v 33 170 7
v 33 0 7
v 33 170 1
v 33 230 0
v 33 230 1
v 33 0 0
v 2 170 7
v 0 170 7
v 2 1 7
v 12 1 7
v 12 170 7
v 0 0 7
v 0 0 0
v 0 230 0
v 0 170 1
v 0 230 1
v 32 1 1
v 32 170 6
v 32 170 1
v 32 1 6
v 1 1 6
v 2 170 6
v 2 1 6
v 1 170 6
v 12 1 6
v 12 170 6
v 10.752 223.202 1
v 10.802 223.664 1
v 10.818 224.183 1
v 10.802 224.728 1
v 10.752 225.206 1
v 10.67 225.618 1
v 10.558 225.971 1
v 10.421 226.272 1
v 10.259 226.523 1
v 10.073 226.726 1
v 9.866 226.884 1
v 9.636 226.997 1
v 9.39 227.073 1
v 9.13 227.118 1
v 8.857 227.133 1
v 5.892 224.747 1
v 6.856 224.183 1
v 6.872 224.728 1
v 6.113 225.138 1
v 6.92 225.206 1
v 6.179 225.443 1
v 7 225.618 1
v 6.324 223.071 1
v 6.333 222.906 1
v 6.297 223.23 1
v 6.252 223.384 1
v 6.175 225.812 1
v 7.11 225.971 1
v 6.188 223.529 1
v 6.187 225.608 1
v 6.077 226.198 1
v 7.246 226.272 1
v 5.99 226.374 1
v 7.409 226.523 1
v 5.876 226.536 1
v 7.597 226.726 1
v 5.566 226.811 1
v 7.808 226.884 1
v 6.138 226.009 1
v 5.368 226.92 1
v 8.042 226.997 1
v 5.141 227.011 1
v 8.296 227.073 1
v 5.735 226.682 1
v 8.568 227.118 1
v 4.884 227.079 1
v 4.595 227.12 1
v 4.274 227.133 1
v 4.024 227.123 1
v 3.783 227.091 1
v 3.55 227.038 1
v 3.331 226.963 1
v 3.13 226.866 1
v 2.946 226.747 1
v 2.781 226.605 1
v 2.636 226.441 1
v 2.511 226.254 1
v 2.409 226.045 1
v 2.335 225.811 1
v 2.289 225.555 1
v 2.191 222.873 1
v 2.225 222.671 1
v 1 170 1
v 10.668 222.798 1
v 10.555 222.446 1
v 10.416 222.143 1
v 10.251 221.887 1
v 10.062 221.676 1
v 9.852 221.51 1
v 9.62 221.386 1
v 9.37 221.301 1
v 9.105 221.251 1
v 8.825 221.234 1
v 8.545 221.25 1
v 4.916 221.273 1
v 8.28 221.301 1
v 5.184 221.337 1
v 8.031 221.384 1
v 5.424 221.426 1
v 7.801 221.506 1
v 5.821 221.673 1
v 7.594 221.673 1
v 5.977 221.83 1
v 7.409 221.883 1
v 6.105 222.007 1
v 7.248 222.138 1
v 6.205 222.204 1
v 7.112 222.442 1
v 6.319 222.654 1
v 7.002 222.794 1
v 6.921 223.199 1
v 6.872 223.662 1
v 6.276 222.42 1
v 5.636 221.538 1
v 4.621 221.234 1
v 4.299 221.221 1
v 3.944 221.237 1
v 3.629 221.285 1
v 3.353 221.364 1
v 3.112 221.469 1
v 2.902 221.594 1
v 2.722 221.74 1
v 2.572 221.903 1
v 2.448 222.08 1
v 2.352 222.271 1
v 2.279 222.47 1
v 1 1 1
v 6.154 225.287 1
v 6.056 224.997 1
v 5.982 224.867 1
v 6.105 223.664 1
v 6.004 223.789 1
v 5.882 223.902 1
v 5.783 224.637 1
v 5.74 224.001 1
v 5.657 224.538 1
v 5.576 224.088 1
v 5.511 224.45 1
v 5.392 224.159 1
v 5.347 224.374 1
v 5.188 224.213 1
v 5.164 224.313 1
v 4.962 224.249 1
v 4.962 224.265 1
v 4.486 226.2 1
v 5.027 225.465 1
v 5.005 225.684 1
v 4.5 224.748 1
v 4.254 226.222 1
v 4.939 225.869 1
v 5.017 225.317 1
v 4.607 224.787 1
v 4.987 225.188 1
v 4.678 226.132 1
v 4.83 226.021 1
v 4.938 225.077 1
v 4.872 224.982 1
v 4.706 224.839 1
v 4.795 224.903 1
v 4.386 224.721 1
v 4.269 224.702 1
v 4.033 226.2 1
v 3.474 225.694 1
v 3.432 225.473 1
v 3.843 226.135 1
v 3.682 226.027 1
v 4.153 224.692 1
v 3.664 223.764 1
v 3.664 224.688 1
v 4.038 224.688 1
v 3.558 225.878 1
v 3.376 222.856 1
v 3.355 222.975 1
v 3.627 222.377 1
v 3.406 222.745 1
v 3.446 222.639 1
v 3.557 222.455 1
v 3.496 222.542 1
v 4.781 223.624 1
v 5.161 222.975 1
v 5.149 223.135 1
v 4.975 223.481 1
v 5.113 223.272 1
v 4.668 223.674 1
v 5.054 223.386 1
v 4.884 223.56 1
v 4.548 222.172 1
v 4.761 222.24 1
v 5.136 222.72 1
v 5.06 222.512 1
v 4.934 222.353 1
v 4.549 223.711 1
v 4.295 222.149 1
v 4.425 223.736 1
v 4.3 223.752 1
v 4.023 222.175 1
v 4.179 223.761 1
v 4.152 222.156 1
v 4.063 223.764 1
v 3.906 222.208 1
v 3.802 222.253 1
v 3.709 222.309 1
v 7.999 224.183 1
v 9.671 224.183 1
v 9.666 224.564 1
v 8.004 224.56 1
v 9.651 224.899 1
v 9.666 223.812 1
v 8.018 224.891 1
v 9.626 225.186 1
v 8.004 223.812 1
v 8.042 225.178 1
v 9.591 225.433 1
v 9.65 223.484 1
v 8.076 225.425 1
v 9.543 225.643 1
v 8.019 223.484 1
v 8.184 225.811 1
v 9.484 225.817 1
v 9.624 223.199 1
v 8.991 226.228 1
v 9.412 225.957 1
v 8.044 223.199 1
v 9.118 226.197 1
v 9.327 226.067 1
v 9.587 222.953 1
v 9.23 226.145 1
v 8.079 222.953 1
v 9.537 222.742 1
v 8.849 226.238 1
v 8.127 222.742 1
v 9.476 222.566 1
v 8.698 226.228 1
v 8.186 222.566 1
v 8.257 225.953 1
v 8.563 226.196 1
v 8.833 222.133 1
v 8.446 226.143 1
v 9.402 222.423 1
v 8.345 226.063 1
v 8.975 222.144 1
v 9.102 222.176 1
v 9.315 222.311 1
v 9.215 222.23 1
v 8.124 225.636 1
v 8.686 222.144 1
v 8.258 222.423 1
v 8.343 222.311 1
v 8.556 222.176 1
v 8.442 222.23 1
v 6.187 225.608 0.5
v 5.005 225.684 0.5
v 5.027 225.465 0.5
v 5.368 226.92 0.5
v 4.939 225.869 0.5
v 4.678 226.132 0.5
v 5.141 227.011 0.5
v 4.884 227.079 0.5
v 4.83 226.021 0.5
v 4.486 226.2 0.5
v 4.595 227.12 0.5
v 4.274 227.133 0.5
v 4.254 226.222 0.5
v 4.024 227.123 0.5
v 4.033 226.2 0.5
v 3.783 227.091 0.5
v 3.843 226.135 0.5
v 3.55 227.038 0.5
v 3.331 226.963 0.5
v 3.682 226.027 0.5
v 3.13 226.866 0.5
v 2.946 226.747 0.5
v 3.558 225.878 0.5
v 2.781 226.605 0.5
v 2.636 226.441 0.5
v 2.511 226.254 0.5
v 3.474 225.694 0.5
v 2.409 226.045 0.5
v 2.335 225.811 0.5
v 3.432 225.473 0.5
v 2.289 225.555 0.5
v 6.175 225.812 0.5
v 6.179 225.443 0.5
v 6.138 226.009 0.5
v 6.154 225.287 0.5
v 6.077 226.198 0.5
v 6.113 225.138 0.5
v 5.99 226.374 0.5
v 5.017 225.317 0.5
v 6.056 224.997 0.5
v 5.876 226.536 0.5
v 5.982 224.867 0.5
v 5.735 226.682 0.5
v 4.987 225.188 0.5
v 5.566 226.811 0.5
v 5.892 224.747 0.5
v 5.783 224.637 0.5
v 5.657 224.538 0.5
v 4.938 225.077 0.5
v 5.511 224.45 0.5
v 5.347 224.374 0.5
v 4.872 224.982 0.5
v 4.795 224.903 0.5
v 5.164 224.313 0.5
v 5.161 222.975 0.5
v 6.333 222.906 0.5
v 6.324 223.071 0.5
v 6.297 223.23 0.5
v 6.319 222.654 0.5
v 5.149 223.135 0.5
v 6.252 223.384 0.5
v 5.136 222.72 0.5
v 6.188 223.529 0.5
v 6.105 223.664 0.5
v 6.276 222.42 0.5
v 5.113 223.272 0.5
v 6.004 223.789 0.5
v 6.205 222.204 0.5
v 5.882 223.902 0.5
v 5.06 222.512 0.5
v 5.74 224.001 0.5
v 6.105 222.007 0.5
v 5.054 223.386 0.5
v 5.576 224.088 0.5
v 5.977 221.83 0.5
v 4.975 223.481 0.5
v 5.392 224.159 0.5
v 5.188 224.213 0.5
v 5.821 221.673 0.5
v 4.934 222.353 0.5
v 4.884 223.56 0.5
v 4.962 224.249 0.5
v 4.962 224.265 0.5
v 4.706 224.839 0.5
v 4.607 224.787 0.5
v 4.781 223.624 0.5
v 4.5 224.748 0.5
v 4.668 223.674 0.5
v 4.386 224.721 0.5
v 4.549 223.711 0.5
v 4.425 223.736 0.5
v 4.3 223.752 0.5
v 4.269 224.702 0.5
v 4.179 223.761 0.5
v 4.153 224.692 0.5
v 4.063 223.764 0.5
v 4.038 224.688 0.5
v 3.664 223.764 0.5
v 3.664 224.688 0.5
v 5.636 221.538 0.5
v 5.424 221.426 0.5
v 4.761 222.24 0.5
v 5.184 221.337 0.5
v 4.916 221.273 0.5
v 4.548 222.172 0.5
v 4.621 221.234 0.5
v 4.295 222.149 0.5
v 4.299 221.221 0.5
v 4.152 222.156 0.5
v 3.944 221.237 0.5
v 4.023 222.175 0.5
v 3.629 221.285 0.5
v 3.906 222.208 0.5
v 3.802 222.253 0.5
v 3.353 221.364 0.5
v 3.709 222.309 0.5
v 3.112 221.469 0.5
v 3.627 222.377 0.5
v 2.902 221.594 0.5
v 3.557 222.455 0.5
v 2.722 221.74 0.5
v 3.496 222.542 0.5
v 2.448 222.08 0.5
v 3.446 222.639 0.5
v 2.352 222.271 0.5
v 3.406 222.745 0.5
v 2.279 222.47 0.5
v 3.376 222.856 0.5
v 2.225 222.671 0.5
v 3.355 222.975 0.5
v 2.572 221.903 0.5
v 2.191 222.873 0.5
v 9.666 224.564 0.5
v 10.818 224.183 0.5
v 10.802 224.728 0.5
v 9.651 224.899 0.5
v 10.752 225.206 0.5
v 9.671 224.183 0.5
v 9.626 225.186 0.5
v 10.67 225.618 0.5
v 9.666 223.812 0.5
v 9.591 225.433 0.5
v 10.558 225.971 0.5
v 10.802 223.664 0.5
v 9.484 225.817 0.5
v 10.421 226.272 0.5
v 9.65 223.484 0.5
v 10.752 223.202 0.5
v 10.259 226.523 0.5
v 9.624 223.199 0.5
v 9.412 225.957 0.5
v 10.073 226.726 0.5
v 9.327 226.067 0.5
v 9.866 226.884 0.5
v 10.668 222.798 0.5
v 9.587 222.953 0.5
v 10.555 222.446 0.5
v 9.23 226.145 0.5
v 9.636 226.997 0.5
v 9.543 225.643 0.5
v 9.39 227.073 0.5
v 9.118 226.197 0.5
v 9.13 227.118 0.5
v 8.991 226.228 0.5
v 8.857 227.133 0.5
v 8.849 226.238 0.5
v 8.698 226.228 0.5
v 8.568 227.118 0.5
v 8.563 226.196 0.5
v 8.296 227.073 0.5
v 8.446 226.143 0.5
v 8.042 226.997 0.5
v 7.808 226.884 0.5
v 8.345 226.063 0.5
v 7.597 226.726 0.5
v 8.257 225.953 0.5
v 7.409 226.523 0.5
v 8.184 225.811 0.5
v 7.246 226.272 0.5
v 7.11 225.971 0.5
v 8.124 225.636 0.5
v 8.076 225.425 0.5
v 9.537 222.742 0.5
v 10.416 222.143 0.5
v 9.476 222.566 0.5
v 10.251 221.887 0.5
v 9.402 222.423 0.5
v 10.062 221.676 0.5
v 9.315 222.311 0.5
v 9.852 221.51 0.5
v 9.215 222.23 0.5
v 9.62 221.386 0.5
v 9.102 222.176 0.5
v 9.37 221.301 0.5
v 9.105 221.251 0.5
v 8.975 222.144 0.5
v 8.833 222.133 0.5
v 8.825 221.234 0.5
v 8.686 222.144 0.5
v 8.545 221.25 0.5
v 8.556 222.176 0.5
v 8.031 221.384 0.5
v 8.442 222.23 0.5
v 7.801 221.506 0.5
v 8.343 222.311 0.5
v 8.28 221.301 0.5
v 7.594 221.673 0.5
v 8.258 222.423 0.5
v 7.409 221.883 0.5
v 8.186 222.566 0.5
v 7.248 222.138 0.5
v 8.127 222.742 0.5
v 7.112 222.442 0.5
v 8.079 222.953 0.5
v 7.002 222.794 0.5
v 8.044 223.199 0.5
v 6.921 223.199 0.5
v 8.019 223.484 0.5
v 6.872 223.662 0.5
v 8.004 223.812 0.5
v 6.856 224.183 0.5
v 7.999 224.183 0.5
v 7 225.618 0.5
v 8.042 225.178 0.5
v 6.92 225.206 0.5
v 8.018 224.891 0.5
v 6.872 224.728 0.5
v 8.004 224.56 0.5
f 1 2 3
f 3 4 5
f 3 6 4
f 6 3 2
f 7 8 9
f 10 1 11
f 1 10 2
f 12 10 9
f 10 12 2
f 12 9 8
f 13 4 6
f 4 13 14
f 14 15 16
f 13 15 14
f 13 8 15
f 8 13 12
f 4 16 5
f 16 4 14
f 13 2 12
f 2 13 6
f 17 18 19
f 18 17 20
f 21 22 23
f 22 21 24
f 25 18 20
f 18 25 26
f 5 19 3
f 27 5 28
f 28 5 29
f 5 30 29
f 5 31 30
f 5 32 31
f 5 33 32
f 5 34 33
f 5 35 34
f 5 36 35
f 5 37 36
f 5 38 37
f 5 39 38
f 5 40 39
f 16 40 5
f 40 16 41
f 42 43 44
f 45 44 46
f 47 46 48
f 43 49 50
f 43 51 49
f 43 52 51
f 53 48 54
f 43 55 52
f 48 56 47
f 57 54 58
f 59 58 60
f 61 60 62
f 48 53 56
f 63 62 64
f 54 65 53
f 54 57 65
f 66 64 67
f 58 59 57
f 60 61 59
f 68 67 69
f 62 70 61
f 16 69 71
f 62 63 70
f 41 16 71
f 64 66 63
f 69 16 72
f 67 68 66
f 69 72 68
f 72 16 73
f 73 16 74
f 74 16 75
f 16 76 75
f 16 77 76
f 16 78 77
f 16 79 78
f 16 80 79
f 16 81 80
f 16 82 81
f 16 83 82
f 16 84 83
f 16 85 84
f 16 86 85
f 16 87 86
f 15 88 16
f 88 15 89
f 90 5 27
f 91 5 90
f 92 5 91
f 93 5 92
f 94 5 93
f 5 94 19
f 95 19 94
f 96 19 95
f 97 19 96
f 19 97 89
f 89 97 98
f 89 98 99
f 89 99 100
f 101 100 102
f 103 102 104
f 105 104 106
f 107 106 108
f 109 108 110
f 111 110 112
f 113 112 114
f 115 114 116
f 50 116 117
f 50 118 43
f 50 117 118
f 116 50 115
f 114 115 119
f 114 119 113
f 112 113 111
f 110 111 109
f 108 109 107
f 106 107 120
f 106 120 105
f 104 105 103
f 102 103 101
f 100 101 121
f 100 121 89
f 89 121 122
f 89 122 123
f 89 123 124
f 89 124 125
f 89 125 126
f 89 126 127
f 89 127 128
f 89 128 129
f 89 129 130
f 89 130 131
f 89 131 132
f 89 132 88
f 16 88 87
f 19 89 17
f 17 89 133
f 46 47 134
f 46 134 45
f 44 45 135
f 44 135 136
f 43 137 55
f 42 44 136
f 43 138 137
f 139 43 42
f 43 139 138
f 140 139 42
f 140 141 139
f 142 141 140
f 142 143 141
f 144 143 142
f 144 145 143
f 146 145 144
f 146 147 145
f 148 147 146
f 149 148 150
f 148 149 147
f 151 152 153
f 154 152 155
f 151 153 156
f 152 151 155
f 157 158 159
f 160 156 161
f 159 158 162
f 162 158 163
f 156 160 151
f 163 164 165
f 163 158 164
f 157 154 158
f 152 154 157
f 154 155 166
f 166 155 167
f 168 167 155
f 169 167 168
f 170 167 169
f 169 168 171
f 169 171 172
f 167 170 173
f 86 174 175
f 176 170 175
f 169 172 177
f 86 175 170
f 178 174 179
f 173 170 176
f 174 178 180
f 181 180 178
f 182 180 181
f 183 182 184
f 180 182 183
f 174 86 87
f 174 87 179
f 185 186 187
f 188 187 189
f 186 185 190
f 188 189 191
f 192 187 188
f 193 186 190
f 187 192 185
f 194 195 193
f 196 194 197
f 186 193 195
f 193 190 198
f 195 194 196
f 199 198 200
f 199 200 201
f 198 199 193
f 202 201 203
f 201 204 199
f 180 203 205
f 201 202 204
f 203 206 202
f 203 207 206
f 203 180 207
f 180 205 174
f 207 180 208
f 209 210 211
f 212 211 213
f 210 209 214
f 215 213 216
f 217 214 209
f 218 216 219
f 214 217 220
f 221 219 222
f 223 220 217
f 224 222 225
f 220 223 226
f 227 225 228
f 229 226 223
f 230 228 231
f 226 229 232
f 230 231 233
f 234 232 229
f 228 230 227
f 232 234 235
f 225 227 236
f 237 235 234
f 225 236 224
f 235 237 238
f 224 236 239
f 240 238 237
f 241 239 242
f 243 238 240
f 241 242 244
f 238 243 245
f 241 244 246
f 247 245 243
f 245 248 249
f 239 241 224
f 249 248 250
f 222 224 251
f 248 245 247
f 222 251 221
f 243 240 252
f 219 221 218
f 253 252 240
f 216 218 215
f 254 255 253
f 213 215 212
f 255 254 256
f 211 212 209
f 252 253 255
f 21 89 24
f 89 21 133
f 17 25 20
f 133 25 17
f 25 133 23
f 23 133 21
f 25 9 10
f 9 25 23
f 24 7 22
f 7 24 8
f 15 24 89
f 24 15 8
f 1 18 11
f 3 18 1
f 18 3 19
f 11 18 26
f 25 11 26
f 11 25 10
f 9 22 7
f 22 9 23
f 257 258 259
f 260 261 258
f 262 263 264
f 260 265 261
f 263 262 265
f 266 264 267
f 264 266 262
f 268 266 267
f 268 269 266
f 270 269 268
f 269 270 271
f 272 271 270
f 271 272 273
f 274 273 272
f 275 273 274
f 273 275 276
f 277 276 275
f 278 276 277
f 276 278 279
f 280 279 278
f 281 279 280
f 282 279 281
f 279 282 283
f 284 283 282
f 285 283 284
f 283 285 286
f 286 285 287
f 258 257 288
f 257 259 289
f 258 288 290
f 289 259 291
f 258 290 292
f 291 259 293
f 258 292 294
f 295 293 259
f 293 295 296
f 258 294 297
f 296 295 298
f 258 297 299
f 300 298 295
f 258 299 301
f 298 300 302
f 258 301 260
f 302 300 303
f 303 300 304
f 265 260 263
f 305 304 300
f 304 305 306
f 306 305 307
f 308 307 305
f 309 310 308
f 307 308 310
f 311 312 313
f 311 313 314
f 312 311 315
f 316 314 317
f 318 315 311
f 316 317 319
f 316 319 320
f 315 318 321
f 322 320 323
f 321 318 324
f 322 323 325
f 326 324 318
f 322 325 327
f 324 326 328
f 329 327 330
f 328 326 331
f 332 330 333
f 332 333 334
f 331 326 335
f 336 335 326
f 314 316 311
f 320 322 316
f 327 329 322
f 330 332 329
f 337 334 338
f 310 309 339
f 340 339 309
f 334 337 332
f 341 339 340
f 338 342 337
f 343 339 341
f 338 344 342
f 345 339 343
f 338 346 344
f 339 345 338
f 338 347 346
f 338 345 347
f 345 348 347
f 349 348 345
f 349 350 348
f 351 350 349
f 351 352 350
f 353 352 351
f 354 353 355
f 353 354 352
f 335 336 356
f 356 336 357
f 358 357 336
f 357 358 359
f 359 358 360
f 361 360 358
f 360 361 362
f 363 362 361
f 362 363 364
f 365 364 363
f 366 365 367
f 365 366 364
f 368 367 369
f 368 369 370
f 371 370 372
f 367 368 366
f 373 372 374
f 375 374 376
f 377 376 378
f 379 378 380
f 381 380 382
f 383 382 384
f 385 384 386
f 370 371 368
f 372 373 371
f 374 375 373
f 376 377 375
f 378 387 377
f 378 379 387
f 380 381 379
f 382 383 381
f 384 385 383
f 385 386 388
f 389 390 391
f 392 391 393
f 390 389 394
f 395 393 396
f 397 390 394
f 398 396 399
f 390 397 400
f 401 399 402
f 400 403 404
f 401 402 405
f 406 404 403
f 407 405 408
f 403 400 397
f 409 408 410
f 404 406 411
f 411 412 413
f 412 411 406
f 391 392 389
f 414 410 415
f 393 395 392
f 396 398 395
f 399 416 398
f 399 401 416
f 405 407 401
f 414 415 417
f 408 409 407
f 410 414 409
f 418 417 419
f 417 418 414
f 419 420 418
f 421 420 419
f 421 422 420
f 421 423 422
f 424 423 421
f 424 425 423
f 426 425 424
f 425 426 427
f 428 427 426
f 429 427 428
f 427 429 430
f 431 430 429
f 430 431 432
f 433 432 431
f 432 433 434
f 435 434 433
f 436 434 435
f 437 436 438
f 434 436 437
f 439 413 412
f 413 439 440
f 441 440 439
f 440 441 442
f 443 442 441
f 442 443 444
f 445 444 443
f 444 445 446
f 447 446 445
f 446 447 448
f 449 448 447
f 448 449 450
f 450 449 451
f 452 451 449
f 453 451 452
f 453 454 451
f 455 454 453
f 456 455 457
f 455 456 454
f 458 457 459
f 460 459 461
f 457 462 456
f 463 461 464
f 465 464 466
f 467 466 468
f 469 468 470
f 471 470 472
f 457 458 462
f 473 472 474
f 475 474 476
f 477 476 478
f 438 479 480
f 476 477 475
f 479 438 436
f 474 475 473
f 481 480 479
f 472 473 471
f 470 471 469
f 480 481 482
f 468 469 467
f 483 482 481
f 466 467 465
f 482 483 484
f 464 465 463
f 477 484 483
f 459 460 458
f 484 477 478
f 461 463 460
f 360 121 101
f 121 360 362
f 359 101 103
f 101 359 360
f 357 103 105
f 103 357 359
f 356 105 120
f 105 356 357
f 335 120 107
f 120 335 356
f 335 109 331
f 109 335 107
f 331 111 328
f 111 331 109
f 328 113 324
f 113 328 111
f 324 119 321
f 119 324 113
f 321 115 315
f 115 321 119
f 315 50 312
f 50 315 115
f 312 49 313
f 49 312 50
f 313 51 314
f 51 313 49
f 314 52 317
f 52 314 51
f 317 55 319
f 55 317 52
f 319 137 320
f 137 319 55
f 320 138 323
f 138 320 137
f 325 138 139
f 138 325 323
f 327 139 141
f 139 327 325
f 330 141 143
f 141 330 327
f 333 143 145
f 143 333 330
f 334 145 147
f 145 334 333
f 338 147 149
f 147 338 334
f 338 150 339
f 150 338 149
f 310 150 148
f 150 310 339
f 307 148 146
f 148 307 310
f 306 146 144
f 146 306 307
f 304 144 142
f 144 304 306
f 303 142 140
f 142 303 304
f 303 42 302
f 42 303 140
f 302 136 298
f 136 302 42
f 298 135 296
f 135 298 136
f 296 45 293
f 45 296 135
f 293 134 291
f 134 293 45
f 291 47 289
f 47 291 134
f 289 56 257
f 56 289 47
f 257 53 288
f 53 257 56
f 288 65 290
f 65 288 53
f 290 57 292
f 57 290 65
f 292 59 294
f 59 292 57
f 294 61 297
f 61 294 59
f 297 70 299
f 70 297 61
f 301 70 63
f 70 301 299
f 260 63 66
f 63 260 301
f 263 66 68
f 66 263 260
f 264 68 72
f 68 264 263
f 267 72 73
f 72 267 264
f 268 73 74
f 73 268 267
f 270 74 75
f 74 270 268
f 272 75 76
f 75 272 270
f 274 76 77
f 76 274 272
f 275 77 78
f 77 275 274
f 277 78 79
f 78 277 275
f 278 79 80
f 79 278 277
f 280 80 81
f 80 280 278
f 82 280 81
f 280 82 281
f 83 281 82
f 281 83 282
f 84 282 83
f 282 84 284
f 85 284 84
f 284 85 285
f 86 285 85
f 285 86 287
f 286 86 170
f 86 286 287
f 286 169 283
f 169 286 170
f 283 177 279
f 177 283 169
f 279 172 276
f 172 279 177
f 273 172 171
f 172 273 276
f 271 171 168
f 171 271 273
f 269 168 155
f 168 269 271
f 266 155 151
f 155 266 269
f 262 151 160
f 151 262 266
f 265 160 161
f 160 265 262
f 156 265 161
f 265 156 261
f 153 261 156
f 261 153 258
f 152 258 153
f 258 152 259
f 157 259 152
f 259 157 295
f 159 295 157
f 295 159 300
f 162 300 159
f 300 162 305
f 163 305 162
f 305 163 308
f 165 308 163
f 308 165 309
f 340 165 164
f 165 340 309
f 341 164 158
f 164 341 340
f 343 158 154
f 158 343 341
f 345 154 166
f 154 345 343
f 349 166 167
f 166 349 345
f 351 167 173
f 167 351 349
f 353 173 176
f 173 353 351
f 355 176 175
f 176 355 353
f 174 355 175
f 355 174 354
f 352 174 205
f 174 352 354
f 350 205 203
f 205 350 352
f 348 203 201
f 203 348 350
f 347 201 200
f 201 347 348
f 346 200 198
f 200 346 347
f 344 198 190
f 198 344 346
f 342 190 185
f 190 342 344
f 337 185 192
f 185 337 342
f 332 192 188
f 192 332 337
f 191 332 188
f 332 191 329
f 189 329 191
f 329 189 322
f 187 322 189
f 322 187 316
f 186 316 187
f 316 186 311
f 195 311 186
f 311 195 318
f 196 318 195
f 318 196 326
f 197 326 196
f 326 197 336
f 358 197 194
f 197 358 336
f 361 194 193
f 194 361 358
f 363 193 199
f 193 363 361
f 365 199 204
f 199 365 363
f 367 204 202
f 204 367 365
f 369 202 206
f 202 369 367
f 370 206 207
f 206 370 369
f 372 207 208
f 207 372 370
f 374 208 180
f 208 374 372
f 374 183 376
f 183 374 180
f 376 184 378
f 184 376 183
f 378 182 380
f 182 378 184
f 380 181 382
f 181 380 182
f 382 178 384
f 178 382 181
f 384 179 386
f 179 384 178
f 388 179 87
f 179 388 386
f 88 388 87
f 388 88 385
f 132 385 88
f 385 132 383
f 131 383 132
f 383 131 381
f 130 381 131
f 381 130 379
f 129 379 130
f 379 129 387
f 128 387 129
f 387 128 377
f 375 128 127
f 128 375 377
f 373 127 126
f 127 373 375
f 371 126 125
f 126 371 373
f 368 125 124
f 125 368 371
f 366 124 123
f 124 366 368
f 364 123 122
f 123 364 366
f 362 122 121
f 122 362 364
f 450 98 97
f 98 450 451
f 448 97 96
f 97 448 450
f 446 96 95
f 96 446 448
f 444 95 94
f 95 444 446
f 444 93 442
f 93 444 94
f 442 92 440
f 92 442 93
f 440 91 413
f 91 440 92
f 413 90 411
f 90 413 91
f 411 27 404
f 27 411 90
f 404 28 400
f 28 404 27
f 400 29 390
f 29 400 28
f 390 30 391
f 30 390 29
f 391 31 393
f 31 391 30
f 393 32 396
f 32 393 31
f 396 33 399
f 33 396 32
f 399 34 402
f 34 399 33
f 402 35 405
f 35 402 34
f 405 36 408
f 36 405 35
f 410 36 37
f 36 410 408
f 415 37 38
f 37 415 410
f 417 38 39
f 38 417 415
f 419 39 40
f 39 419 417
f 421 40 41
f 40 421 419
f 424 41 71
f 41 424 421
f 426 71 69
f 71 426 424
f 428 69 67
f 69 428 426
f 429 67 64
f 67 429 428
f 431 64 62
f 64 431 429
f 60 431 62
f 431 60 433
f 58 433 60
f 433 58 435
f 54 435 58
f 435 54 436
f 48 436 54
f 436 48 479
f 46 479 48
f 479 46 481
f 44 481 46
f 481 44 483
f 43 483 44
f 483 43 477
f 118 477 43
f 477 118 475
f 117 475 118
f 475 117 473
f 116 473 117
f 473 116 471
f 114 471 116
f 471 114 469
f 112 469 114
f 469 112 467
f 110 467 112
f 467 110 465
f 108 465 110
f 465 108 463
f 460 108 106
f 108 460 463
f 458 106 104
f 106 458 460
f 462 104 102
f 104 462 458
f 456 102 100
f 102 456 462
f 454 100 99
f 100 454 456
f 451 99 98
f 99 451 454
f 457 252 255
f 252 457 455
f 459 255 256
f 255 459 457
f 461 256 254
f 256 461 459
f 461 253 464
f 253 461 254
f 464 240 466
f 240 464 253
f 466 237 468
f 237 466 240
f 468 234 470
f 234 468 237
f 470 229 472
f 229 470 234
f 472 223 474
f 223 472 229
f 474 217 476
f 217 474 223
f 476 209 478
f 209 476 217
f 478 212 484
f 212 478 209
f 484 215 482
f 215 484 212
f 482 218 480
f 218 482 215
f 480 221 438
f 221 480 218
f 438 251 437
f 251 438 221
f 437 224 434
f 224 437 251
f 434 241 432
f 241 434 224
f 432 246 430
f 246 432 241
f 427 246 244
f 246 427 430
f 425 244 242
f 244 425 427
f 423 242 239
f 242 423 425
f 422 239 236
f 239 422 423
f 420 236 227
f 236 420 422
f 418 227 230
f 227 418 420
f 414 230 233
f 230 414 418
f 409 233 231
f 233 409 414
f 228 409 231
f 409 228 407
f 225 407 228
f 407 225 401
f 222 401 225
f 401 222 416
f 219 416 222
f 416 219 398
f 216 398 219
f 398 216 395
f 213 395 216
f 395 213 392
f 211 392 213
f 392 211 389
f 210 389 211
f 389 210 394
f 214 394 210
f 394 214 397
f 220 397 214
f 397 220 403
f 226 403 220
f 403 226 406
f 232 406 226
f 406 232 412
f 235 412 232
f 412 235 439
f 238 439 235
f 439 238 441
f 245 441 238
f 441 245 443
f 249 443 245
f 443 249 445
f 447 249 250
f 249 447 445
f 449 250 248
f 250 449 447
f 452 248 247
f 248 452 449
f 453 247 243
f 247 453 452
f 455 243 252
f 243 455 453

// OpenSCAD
width = 30;
height = 217 + 13;
depth = 5;
wall = 1;
padding = 0.5;
top_window_size = 60;
lateral_window_size = 10;
label = "30";
text_size = 6.0;

difference () {
cube([width+wall*2+padding*2, height, depth+wall*2]);
translate([wall,wall,wall])cube([width+padding*2, height-wall, depth]);
translate([0,height-top_window_size,wall])cube([width+wall*2+padding*2,top_window_size,depth+wall]);
translate([wall*2,wall,depth-wall]) cube([lateral_window_size, height, depth]);
translate([wall*2, height-text_size/2, wall/2]) linear_extrude(1) text(label,size=text_size, halign="left", valign="top",font ="Liberation Sans:style=Bold");
}
